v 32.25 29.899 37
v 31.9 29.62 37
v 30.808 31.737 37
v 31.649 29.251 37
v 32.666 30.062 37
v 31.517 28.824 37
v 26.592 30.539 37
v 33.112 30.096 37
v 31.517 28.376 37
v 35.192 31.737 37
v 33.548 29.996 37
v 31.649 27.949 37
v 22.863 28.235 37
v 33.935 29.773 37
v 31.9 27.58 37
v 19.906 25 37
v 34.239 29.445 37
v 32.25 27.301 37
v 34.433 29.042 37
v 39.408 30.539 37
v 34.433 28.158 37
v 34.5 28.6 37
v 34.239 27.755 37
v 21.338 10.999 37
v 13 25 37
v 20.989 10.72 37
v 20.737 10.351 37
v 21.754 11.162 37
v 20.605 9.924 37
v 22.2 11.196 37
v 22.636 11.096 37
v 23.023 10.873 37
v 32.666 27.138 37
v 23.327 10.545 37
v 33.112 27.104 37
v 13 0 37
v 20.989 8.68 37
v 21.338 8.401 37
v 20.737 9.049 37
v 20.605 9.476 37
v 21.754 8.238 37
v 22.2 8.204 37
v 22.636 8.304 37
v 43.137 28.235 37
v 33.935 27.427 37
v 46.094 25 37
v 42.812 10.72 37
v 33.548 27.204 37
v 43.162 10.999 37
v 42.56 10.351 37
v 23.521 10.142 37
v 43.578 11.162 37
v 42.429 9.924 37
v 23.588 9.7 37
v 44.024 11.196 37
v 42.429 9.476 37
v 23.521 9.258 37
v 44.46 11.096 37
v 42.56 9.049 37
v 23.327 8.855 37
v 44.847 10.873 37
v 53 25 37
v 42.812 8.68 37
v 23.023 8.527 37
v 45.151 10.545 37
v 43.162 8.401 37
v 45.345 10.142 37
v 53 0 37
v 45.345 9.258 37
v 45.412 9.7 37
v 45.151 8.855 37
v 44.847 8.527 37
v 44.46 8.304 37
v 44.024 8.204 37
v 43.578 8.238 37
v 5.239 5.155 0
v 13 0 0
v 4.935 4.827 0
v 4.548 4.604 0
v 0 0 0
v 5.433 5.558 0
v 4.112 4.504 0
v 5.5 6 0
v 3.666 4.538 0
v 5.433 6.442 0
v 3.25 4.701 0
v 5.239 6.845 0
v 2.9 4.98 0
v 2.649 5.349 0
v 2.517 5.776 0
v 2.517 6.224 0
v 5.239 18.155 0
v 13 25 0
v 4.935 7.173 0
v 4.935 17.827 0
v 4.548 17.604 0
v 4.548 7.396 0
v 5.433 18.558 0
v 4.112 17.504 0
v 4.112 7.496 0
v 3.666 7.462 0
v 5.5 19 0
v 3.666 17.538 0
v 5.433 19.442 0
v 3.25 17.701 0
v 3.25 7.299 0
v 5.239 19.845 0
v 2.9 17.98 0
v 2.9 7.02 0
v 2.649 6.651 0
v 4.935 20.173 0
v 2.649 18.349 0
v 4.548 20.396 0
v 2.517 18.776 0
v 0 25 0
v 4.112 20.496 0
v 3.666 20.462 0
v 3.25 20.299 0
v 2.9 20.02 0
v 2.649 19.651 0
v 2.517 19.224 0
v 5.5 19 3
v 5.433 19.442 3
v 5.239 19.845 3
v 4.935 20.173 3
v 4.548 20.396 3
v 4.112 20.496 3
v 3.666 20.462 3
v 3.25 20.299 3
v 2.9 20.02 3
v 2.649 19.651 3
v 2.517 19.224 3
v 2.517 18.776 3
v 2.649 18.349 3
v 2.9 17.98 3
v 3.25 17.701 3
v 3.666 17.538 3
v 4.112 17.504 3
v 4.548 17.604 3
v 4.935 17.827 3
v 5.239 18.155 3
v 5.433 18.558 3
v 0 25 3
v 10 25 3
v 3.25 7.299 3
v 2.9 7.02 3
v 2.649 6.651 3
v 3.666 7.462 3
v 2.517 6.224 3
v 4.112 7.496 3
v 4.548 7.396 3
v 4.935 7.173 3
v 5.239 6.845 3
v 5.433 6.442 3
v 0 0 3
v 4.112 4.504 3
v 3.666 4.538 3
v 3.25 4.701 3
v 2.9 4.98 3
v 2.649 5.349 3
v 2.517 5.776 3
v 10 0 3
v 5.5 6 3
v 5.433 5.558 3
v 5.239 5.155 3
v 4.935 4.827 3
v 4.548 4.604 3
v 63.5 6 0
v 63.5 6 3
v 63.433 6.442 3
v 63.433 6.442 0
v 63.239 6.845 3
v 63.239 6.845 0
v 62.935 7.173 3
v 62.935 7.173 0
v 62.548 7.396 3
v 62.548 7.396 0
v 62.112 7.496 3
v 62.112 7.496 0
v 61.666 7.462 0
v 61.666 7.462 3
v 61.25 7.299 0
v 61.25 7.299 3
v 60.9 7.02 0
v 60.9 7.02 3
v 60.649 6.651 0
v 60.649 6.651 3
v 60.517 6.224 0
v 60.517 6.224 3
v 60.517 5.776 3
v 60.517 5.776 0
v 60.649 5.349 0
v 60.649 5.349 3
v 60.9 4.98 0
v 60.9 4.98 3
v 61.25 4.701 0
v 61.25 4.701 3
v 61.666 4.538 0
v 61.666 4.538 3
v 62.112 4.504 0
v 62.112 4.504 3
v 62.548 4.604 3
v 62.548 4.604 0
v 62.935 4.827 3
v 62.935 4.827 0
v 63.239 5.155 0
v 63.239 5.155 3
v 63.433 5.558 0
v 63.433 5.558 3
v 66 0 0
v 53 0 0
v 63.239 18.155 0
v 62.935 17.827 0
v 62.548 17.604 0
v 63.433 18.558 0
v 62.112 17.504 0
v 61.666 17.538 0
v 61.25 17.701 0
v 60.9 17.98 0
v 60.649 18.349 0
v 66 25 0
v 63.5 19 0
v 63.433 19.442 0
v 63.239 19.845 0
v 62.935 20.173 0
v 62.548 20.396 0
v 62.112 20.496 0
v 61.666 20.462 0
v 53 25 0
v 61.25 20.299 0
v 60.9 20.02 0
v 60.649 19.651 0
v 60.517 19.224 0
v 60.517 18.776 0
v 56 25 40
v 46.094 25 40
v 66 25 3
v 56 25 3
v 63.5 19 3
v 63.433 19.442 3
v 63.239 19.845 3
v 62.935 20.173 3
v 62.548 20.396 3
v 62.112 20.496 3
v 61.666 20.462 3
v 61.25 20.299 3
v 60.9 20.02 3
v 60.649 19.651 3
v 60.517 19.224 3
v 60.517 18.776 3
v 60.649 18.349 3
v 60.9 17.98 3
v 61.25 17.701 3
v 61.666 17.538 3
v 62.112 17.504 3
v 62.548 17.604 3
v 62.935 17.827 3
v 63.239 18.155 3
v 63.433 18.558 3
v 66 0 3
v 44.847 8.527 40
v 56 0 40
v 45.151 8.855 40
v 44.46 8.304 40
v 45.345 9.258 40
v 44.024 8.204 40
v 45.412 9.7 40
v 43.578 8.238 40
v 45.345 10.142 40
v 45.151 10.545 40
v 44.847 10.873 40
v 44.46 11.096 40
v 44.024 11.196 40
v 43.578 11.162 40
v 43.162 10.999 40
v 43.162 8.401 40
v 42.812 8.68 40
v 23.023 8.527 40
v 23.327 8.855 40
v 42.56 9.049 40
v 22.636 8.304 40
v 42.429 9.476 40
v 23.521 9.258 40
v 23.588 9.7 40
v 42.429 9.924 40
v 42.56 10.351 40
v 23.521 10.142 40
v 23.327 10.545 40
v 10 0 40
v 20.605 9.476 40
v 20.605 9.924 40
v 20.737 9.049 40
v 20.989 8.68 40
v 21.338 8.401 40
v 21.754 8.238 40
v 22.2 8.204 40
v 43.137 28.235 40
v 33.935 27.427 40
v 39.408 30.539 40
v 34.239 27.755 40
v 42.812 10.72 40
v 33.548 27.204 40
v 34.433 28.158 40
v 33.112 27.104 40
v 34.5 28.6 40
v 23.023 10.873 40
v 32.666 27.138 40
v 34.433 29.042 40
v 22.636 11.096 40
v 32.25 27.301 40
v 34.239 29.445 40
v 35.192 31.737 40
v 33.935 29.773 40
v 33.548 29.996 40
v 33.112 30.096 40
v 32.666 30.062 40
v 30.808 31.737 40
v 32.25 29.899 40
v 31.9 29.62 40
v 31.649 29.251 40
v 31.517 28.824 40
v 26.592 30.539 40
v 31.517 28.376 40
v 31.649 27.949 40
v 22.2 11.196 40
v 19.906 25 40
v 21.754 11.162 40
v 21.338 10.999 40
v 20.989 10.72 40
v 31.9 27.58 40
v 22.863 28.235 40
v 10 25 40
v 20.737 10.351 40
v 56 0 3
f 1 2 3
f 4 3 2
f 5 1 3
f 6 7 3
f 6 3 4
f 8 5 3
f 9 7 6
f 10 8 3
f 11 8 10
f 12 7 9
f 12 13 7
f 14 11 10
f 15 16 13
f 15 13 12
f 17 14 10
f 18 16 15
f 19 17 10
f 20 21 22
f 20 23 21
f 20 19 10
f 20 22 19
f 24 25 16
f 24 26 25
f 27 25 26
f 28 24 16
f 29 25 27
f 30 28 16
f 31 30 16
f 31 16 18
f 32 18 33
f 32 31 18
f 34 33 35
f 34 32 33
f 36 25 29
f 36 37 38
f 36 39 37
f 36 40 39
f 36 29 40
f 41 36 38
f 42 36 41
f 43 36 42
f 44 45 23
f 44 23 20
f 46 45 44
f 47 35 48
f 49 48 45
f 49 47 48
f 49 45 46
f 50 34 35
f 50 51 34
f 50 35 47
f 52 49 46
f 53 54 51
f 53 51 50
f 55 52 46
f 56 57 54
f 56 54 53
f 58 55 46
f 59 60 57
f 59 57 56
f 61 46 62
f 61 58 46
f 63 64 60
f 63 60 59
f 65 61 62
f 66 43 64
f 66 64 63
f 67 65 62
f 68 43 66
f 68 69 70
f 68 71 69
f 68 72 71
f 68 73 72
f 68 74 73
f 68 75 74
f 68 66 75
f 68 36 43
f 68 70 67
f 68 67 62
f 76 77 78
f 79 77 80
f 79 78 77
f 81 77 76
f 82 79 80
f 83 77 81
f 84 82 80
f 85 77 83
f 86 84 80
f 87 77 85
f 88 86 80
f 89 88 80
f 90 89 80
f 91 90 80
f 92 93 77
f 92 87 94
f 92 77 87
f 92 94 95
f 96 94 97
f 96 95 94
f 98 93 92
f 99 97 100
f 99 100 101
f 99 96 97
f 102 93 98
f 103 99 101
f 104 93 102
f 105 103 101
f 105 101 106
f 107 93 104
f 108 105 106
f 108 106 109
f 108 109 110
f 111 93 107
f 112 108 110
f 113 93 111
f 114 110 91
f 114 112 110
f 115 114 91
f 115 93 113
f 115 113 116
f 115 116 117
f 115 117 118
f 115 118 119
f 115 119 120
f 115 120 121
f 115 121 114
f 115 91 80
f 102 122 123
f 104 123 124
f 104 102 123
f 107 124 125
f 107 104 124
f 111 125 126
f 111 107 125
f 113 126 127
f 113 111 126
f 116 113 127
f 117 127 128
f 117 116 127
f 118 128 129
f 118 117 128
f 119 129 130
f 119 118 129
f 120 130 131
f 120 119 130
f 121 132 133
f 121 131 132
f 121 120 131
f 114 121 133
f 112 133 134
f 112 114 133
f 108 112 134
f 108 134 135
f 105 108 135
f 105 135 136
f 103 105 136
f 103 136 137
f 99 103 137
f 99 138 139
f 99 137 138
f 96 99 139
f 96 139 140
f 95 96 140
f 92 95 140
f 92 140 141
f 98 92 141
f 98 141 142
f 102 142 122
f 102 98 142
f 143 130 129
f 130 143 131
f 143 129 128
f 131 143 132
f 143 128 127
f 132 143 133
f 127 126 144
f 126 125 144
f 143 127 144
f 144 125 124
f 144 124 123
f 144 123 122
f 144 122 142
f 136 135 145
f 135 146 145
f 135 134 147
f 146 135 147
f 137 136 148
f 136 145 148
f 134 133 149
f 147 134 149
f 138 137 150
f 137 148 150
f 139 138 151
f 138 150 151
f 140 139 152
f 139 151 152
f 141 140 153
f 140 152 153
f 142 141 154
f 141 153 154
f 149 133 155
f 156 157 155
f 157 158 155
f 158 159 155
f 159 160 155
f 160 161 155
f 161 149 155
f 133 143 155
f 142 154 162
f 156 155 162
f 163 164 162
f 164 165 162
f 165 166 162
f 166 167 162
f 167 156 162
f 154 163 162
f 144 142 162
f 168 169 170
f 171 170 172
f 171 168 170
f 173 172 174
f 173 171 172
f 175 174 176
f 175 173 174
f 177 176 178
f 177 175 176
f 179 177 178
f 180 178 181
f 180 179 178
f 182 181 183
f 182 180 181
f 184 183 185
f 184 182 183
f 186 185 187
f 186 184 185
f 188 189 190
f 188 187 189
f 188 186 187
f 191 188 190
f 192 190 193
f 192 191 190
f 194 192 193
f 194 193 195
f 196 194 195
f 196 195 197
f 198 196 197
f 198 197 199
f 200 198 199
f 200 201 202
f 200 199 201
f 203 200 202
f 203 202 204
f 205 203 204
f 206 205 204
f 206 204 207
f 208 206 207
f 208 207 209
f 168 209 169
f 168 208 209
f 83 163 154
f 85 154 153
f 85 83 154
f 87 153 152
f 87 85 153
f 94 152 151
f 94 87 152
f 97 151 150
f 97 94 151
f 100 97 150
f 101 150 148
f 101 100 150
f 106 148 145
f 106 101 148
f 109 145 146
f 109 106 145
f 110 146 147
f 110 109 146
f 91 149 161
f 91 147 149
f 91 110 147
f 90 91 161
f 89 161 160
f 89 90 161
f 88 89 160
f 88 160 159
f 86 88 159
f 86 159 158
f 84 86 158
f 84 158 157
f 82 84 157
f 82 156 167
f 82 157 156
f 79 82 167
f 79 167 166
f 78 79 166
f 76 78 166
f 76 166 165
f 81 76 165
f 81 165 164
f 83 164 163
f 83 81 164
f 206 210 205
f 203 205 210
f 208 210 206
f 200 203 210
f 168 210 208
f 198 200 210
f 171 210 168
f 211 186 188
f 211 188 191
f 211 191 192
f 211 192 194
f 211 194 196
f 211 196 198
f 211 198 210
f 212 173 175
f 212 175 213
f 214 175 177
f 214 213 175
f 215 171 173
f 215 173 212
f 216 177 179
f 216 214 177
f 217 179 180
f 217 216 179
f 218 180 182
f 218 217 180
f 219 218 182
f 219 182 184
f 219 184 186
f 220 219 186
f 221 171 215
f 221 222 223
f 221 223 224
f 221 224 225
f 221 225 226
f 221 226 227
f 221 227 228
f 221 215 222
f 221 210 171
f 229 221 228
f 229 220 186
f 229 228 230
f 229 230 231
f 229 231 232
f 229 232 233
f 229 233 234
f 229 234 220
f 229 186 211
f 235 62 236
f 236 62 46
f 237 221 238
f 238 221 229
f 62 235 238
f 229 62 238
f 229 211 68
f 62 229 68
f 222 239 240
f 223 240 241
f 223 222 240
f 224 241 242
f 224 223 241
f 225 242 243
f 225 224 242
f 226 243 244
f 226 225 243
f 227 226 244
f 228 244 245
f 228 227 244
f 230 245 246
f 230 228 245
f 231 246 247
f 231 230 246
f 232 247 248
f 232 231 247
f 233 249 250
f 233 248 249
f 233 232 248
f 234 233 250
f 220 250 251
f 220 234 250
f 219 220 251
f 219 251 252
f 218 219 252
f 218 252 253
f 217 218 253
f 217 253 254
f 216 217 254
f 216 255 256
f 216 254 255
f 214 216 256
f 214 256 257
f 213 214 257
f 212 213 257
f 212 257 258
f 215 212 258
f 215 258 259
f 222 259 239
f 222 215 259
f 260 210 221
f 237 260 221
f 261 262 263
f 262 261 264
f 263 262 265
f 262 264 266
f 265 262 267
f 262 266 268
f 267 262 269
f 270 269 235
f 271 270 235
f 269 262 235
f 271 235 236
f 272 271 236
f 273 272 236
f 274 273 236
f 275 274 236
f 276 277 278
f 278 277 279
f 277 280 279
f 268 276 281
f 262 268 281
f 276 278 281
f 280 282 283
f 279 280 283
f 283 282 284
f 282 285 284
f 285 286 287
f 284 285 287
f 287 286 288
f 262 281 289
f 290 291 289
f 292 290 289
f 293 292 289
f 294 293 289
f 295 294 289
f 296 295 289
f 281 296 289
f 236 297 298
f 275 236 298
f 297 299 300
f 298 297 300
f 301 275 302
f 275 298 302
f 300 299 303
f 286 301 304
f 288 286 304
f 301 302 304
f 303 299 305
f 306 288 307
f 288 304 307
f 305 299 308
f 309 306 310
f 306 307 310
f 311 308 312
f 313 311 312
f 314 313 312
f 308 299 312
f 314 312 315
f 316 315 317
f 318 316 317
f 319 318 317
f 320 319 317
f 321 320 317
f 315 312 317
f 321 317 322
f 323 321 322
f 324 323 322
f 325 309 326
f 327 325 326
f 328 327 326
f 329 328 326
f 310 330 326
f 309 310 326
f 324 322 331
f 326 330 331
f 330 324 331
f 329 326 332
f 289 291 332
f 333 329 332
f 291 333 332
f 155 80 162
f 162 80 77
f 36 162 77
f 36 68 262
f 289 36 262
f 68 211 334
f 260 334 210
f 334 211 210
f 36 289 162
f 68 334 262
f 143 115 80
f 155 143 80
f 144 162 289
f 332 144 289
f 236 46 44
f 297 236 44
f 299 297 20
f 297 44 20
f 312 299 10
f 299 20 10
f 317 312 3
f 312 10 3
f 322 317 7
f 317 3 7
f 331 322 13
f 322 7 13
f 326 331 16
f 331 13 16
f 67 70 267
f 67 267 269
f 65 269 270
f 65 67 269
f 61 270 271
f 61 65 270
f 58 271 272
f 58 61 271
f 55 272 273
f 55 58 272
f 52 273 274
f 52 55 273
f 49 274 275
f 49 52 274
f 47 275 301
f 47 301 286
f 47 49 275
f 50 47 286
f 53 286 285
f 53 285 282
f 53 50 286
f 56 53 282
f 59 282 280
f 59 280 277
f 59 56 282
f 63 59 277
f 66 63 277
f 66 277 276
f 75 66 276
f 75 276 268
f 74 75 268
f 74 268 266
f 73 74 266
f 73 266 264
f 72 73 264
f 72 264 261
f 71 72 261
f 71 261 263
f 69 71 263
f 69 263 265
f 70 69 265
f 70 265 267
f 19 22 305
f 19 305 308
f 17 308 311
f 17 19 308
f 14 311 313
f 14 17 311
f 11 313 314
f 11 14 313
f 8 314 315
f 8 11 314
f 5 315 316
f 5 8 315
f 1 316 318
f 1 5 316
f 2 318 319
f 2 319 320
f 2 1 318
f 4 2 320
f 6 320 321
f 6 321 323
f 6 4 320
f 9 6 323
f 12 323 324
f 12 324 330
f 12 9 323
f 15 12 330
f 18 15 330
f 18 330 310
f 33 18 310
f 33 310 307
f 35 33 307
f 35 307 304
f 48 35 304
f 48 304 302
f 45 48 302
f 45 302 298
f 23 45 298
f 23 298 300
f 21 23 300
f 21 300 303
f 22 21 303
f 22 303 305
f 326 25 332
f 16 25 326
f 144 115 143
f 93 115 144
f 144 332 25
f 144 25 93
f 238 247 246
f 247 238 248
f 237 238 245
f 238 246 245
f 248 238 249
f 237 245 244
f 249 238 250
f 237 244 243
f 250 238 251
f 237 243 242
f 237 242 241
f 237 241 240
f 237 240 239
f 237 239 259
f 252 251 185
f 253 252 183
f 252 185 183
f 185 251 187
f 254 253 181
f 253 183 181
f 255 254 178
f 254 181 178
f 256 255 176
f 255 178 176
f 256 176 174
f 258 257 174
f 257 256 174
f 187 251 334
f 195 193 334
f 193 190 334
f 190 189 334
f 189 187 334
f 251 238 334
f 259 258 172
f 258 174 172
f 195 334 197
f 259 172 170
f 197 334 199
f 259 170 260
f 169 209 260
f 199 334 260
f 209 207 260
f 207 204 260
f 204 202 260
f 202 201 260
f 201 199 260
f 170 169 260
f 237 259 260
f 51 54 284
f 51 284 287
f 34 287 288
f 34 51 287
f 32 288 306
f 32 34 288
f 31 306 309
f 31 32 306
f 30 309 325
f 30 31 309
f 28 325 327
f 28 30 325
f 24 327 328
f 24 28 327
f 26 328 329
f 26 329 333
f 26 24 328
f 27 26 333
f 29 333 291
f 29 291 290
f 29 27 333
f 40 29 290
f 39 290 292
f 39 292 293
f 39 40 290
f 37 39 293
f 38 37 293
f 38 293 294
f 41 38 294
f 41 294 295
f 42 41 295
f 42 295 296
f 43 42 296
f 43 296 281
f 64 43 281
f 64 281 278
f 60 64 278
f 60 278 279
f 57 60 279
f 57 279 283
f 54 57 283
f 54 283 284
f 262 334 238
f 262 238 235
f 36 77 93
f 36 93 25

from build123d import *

# Parameters (mm, degrees)
SKETCH_R      = 1.5
PAD_DEPTH     = 40
SKETCH001_W   = 10
SKETCH001_H   = 37
SKETCH001_W_2 = 40
POCKET_DEPTH  = 31.890025


with BuildPart() as part:
    # Sketch → Pad (new body)
    with BuildSketch(Plane.XY):
        with BuildLine():
            Line((0, 25), (19.905684, 25))
            ThreePointArc((46.094316, 25), (33, 31.889025), (19.905684, 25))
            Line((66, 25), (46.094316, 25))
            Line((66, 0), (66, 25))
            Line((0, 0), (66, 0))
            Line((0, 25), (0, 0))
        make_face()
        with Locations((33, 28.6)):
            Circle(SKETCH_R, mode=Mode.SUBTRACT)
        with Locations((43.91192, 9.7)):
            Circle(SKETCH_R, mode=Mode.SUBTRACT)
        with Locations((22.08808, 9.7)):
            Circle(SKETCH_R, mode=Mode.SUBTRACT)
        with Locations((4, 19)):
            Circle(SKETCH_R, mode=Mode.SUBTRACT)
        with Locations((4, 6)):
            Circle(SKETCH_R, mode=Mode.SUBTRACT)
        with Locations((62, 19)):
            Circle(SKETCH_R, mode=Mode.SUBTRACT)
        with Locations((62, 6)):
            Circle(SKETCH_R, mode=Mode.SUBTRACT)
    extrude(amount=PAD_DEPTH)

    # Sketch001 → Pocket (cut, through all)
    with BuildSketch(Plane.XZ):
        with Locations((5, 21.5)):
            Rectangle(SKETCH001_W, SKETCH001_H)
        with Locations((33, 18.5)):
            Rectangle(SKETCH001_W_2, SKETCH001_H)
        with Locations((61, 21.5)):
            Rectangle(SKETCH001_W, SKETCH001_H)
    extrude(amount=-POCKET_DEPTH, mode=Mode.SUBTRACT)


solid = part.part
